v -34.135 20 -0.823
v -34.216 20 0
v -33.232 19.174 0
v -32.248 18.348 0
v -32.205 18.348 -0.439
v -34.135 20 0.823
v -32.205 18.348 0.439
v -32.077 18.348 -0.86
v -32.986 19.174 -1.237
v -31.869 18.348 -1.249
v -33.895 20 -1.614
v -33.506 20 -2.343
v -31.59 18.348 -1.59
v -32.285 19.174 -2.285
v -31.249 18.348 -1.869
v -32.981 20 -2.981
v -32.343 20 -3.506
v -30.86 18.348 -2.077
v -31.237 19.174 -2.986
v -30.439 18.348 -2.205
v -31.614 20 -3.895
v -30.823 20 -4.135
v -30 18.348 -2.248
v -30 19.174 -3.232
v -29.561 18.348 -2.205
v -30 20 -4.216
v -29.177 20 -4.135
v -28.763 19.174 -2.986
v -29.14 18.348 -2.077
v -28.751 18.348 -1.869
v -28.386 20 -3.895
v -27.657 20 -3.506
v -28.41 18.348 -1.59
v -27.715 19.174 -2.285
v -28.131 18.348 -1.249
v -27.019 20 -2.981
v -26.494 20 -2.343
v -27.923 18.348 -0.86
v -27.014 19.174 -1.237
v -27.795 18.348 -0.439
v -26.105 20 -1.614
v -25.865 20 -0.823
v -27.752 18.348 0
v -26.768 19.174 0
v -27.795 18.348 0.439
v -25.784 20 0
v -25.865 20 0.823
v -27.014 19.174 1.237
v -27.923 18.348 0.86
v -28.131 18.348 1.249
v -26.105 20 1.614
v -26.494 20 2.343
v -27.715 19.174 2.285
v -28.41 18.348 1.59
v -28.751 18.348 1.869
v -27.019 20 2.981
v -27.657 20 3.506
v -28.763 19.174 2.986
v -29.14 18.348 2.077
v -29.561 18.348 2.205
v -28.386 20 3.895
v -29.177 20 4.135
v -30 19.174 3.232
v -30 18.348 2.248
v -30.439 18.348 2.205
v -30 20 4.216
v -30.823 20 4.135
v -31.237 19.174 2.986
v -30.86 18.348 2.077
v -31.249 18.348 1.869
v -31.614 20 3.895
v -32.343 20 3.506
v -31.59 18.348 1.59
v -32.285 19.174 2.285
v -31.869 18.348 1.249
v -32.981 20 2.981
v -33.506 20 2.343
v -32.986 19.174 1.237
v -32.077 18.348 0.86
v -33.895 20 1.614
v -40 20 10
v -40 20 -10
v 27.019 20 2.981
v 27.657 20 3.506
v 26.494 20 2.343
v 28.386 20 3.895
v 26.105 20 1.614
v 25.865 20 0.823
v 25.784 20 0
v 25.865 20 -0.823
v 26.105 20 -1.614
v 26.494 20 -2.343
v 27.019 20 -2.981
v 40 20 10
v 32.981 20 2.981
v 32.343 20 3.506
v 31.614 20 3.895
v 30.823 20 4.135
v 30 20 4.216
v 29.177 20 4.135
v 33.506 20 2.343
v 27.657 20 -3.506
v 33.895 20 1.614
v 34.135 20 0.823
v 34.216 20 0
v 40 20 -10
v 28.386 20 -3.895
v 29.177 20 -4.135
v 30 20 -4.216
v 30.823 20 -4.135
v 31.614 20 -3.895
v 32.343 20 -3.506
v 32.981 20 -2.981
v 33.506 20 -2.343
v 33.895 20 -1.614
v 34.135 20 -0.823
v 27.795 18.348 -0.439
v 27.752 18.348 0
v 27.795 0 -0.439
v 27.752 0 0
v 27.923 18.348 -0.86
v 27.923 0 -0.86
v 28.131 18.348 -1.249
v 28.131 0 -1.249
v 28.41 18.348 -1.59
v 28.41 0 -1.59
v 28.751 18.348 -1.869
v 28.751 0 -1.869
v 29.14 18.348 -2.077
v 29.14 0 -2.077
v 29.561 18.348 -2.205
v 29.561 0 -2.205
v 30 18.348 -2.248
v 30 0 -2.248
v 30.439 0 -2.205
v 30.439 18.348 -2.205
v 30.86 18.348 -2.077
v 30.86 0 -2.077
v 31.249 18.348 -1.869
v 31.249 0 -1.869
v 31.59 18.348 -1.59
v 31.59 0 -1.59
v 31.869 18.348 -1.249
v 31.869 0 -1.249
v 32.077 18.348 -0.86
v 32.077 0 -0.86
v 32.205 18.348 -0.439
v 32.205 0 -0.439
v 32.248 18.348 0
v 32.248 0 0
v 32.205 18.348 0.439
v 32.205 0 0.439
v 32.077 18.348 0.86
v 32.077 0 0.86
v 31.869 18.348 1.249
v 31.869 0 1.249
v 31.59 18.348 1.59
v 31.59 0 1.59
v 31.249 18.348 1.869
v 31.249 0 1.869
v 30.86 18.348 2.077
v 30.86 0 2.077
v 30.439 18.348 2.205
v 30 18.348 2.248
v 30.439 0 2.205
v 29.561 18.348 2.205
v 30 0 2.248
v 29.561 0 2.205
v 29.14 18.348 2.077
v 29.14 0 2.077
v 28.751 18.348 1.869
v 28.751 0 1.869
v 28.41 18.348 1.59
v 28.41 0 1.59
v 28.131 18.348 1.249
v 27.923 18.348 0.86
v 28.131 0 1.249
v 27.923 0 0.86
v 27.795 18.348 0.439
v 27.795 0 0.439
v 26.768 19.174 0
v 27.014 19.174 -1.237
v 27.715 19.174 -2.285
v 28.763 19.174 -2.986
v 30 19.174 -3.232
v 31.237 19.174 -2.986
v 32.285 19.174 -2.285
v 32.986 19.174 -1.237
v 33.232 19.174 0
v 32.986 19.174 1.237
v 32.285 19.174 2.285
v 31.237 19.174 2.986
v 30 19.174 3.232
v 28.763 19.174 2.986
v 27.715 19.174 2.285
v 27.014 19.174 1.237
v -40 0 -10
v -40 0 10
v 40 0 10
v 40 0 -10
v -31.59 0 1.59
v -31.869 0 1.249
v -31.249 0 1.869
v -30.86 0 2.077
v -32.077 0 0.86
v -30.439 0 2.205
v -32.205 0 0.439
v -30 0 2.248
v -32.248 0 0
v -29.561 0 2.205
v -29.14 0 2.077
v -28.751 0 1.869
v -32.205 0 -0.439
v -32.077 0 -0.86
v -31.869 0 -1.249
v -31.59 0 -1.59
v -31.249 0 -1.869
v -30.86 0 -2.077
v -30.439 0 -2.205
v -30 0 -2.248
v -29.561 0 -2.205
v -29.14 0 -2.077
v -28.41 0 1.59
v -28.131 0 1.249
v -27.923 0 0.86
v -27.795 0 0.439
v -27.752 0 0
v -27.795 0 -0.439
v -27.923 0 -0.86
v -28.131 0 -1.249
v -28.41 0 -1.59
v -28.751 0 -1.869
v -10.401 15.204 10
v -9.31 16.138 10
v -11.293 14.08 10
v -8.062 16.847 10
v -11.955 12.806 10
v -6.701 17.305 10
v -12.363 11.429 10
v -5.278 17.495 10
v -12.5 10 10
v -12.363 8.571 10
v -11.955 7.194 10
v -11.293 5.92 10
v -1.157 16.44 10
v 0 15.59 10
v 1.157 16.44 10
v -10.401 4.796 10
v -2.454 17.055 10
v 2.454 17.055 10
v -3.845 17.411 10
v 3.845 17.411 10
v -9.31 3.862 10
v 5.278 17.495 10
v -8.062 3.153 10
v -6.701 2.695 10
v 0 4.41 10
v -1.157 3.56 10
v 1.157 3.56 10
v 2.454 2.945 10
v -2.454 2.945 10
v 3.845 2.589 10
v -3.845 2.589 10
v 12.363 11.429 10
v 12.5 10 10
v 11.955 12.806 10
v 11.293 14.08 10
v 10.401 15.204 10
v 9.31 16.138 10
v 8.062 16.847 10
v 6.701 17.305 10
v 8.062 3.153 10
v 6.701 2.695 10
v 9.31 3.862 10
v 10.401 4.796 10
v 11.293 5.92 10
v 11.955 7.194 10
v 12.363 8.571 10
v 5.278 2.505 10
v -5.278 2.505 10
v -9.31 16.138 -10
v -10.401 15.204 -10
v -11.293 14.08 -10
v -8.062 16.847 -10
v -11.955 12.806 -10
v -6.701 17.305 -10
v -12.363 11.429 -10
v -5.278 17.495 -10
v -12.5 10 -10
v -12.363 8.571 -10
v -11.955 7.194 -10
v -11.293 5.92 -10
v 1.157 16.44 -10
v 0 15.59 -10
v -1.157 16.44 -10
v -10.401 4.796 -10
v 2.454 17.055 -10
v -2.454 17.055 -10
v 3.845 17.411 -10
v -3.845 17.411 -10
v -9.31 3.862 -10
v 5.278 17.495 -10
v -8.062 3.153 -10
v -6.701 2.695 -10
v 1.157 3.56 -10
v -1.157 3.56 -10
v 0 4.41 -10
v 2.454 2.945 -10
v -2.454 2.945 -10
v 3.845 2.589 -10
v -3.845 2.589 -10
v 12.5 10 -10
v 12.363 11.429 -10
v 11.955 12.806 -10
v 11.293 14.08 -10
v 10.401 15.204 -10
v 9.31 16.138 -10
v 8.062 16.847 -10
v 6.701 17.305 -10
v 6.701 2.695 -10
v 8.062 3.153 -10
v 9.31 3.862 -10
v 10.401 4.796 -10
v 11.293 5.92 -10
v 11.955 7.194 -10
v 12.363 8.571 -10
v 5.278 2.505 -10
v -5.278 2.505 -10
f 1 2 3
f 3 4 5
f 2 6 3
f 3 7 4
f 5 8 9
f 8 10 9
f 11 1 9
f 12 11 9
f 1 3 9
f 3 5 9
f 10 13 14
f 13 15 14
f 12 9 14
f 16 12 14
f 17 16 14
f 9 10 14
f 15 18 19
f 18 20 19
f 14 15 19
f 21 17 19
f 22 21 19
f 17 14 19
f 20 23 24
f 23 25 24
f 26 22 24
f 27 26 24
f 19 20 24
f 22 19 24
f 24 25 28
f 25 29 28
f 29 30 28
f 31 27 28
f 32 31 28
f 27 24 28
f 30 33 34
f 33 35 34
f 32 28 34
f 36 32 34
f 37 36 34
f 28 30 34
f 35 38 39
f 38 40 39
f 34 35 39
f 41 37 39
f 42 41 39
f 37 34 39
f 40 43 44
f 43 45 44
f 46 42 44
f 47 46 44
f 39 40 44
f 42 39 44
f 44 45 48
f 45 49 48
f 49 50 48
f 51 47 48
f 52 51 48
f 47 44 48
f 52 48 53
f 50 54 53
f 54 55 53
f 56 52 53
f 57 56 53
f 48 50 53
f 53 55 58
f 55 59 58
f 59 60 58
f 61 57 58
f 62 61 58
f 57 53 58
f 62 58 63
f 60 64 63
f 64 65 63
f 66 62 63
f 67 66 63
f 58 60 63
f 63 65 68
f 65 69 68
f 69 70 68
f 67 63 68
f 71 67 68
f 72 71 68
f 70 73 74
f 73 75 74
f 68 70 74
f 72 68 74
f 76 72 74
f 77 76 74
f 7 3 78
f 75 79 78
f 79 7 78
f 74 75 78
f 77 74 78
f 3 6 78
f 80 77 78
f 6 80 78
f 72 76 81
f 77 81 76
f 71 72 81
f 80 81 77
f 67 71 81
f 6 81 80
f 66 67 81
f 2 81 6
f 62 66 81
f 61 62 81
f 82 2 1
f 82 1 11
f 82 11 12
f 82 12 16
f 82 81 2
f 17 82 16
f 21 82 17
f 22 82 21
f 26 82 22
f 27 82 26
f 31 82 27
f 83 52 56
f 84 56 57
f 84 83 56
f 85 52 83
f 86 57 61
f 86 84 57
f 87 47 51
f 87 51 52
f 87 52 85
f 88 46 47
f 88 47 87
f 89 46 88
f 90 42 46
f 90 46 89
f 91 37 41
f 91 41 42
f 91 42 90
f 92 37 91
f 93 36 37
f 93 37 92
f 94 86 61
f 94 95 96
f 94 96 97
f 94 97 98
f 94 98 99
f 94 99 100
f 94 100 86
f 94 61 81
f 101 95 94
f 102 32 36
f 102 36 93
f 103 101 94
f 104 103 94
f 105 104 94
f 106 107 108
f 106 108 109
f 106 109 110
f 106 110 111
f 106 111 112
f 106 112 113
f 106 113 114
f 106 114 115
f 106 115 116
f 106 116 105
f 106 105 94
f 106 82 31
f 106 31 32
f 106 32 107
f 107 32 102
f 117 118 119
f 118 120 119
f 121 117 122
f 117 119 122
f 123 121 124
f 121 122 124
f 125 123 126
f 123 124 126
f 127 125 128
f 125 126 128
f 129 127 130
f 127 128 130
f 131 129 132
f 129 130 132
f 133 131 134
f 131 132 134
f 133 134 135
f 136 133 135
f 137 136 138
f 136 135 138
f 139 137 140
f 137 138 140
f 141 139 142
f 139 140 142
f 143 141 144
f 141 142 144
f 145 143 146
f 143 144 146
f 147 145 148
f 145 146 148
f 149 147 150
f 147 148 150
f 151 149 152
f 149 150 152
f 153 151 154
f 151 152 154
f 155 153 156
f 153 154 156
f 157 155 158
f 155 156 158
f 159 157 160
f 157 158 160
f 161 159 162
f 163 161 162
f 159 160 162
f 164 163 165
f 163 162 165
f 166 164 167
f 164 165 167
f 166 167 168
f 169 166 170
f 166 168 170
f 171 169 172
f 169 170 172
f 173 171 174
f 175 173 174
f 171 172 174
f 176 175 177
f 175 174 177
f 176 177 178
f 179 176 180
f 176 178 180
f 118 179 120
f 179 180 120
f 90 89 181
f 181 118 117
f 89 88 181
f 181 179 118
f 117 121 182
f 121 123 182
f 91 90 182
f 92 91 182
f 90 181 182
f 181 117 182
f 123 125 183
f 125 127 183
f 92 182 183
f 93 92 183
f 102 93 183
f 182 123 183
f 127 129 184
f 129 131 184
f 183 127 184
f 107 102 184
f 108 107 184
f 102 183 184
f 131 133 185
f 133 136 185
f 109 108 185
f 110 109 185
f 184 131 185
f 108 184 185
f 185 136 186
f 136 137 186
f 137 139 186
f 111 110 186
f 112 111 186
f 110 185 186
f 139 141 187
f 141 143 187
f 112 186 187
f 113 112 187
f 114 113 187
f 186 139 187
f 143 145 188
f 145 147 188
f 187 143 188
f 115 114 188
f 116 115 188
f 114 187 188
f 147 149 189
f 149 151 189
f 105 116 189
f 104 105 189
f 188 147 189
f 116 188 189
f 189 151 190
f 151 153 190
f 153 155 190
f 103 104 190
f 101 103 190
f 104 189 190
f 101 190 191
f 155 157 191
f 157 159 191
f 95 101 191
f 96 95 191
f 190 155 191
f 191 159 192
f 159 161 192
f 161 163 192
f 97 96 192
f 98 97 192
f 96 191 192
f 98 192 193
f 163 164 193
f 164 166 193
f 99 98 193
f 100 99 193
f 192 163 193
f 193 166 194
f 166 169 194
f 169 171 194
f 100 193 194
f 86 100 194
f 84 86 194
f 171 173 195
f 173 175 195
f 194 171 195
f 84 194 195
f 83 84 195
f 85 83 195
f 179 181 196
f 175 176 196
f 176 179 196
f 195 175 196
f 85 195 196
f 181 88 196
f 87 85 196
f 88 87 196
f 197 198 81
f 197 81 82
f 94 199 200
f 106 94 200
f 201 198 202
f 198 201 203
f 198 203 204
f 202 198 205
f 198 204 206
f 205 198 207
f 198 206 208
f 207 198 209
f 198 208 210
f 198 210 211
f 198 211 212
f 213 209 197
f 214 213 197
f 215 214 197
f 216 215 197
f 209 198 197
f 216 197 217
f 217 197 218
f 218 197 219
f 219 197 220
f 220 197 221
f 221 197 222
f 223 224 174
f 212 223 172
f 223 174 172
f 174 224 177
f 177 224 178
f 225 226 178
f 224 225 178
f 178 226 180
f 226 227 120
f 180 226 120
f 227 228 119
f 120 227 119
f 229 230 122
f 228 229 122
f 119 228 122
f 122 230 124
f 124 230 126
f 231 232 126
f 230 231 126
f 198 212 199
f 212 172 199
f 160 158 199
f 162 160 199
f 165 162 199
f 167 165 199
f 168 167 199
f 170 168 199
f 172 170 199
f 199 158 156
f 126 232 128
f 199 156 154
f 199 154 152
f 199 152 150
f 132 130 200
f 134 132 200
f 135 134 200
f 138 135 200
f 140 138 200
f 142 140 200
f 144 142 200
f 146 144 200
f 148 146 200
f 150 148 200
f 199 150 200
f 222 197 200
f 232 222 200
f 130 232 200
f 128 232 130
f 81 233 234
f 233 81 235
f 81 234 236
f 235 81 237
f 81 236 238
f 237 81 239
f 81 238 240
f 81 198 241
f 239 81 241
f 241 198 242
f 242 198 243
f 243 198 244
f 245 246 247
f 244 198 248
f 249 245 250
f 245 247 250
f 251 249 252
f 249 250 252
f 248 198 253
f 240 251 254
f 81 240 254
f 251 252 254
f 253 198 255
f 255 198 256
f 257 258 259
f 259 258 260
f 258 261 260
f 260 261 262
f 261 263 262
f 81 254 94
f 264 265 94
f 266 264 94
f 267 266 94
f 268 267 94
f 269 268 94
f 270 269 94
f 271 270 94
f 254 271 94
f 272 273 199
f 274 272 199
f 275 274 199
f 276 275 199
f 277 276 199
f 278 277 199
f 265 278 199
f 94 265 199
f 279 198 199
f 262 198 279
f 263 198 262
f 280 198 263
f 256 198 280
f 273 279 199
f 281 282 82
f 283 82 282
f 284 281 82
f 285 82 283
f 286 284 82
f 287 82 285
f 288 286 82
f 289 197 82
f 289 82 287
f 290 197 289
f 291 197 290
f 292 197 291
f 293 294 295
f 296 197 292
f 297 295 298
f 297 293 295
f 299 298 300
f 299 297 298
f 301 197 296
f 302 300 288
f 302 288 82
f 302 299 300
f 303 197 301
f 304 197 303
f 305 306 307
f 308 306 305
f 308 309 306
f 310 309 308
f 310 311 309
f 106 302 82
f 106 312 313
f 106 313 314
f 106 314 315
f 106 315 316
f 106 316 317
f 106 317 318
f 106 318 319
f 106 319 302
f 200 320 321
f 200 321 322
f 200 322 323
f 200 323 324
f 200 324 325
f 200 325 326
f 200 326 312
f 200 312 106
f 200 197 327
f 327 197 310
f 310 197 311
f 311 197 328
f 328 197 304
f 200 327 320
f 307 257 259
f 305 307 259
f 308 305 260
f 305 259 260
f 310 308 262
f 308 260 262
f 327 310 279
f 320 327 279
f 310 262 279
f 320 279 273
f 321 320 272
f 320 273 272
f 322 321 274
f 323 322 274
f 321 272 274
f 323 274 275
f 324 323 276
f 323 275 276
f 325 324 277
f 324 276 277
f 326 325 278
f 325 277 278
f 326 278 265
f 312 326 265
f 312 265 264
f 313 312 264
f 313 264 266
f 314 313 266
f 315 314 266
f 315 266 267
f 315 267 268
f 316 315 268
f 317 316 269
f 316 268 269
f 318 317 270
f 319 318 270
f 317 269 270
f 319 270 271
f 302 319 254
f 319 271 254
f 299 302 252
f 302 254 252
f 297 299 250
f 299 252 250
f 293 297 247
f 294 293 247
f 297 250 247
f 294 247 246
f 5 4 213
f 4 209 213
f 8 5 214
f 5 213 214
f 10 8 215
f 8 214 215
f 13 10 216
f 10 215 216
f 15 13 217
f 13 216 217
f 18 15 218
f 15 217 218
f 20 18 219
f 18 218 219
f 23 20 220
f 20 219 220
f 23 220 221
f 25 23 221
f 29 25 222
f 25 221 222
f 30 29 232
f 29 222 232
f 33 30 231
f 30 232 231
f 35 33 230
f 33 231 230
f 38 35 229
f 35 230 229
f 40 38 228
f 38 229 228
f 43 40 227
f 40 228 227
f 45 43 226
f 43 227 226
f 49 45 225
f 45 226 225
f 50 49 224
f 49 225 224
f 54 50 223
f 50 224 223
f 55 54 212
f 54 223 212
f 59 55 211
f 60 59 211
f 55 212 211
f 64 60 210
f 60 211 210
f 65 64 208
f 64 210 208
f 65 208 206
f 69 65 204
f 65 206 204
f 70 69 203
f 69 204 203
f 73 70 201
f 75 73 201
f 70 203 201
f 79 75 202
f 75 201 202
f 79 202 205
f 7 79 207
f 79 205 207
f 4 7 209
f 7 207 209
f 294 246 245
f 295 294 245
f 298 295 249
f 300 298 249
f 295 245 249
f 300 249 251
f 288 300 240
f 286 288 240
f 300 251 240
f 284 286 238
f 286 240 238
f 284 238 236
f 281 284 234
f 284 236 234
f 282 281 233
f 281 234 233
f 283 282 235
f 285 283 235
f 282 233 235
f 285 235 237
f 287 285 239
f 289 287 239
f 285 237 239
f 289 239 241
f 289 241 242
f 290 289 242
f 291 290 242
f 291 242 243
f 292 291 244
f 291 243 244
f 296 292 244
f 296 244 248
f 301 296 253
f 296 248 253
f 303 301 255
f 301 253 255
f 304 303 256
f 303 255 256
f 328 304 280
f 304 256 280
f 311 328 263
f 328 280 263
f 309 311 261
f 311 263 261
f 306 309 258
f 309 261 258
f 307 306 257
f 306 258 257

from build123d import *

# Parameters (mm, degrees)
SKETCH1_W                                         = 80
SKETCH1_H                                         = 20
BOSS_EXTRUDE1_DEPTH                               = 20
SKETCH2_R                                         = 7.5
CUT_EXTRUDE1_DEPTH                                = 20
CSK_FOR_8_FLAT_HEAD_MACHINE_SCREW_100_D           = 4.4958
CSK_FOR_8_FLAT_HEAD_MACHINE_SCREW_100_CSINK_D     = 8.4328
CSK_FOR_8_FLAT_HEAD_MACHINE_SCREW_100_CSINK_ANGLE = 100


with BuildPart() as part:
    # Sketch1 → Boss-Extrude1 (new body)
    with BuildSketch(Plane(origin=(0, 0, 0), x_dir=(1, 0, 0), z_dir=(0, 1, 0))):
        Rectangle(SKETCH1_W, SKETCH1_H)
    extrude(amount=BOSS_EXTRUDE1_DEPTH)

    # Sketch2 → Cut-Extrude1 (cut)
    with BuildSketch(Plane.XY.offset(10)):
        with Locations((-5, 10)):
            Circle(SKETCH2_R)
        with Locations((5, 10)):
            Circle(SKETCH2_R)
    extrude(amount=-CUT_EXTRUDE1_DEPTH, mode=Mode.SUBTRACT)

    # CSK for #8 Flat Head Machine Screw (100)1 (through all)
    with Locations(Plane(origin=(0, 20, 0), x_dir=(1, 0, 0), z_dir=(0, 1, 0))):
        with Locations((-30, 0), (30, 0)):
            CounterSinkHole(CSK_FOR_8_FLAT_HEAD_MACHINE_SCREW_100_D / 2, CSK_FOR_8_FLAT_HEAD_MACHINE_SCREW_100_CSINK_D / 2, counter_sink_angle=CSK_FOR_8_FLAT_HEAD_MACHINE_SCREW_100_CSINK_ANGLE)


solid = part.part
